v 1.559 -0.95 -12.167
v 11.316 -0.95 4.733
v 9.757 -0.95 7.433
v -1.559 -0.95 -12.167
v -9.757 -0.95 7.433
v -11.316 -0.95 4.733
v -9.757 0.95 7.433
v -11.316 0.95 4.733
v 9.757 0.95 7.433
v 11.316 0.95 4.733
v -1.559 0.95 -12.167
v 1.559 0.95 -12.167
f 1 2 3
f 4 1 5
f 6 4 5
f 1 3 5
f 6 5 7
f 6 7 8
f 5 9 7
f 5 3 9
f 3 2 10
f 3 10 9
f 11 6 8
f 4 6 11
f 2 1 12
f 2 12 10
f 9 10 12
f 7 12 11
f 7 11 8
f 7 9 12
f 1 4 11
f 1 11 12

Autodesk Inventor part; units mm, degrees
ref_plane "YZ Plane" through (0, 0, 0) normal (1, 0, 0) x (0, 1, 0)
ref_plane "XZ Plane" through (0, 0, 0) normal (0, 1, 0) x (-1, 0, 0)
ref_plane "XY Plane" through (0, 0, 0) normal (0, 0, 1) x (1, 0, 0)
sketch "Sketch1" plane through (0, 0, 0) normal (0, 1, 0) x (-1, 0, 0)
  line L0 (1.5588, -12.1667) -> (-1.5588, -12.1667)
  line L1 (-1.5588, -12.1667) -> (-11.3161, 4.7333)
  line L2 (-11.3161, 4.7333) -> (-9.7572, 7.4333)
  line L3 (-9.7572, 7.4333) -> (9.7572, 7.4333)
  line L4 (9.7572, 7.4333) -> (11.3161, 4.7333)
  line L5 (11.3161, 4.7333) -> (1.5588, -12.1667)
  circle A0 centre (0, 0) radius 7.4333 construction
  line L6 (-1.5588, -12.1667) -> (-3.1177, -14.8667) construction
  line L7 (-3.1177, -14.8667) -> (-22.6321, -14.8667) construction
  line L8 (-22.6321, -14.8667) -> (-24.191, -12.1667) construction
  line L9 (-24.191, -12.1667) -> (-14.4338, 4.7333) construction
  line L10 (-14.4338, 4.7333) -> (-11.3161, 4.7333) construction
  dimension "d0" = 19.6
  dimension "d1" = 3.1177
  dimension "d4" = 14.8667
  dimension "d5" = 22.3
extrude "Extrusion1" add sketch "Sketch1" along normal mid plane 1.9
equation "\"d0\" = CouncilTriangleTrimmed"
equation "\"d5\" = CouncilTriangleHeight"
equation "\"CouncilTriangleHeight\" = 22.3"
equation "\"CouncilTriangleTrimmed\" = 19.6"
properties part number "FactionSpecial_Council_CommandToken_Single" material "ABS Plastic"
